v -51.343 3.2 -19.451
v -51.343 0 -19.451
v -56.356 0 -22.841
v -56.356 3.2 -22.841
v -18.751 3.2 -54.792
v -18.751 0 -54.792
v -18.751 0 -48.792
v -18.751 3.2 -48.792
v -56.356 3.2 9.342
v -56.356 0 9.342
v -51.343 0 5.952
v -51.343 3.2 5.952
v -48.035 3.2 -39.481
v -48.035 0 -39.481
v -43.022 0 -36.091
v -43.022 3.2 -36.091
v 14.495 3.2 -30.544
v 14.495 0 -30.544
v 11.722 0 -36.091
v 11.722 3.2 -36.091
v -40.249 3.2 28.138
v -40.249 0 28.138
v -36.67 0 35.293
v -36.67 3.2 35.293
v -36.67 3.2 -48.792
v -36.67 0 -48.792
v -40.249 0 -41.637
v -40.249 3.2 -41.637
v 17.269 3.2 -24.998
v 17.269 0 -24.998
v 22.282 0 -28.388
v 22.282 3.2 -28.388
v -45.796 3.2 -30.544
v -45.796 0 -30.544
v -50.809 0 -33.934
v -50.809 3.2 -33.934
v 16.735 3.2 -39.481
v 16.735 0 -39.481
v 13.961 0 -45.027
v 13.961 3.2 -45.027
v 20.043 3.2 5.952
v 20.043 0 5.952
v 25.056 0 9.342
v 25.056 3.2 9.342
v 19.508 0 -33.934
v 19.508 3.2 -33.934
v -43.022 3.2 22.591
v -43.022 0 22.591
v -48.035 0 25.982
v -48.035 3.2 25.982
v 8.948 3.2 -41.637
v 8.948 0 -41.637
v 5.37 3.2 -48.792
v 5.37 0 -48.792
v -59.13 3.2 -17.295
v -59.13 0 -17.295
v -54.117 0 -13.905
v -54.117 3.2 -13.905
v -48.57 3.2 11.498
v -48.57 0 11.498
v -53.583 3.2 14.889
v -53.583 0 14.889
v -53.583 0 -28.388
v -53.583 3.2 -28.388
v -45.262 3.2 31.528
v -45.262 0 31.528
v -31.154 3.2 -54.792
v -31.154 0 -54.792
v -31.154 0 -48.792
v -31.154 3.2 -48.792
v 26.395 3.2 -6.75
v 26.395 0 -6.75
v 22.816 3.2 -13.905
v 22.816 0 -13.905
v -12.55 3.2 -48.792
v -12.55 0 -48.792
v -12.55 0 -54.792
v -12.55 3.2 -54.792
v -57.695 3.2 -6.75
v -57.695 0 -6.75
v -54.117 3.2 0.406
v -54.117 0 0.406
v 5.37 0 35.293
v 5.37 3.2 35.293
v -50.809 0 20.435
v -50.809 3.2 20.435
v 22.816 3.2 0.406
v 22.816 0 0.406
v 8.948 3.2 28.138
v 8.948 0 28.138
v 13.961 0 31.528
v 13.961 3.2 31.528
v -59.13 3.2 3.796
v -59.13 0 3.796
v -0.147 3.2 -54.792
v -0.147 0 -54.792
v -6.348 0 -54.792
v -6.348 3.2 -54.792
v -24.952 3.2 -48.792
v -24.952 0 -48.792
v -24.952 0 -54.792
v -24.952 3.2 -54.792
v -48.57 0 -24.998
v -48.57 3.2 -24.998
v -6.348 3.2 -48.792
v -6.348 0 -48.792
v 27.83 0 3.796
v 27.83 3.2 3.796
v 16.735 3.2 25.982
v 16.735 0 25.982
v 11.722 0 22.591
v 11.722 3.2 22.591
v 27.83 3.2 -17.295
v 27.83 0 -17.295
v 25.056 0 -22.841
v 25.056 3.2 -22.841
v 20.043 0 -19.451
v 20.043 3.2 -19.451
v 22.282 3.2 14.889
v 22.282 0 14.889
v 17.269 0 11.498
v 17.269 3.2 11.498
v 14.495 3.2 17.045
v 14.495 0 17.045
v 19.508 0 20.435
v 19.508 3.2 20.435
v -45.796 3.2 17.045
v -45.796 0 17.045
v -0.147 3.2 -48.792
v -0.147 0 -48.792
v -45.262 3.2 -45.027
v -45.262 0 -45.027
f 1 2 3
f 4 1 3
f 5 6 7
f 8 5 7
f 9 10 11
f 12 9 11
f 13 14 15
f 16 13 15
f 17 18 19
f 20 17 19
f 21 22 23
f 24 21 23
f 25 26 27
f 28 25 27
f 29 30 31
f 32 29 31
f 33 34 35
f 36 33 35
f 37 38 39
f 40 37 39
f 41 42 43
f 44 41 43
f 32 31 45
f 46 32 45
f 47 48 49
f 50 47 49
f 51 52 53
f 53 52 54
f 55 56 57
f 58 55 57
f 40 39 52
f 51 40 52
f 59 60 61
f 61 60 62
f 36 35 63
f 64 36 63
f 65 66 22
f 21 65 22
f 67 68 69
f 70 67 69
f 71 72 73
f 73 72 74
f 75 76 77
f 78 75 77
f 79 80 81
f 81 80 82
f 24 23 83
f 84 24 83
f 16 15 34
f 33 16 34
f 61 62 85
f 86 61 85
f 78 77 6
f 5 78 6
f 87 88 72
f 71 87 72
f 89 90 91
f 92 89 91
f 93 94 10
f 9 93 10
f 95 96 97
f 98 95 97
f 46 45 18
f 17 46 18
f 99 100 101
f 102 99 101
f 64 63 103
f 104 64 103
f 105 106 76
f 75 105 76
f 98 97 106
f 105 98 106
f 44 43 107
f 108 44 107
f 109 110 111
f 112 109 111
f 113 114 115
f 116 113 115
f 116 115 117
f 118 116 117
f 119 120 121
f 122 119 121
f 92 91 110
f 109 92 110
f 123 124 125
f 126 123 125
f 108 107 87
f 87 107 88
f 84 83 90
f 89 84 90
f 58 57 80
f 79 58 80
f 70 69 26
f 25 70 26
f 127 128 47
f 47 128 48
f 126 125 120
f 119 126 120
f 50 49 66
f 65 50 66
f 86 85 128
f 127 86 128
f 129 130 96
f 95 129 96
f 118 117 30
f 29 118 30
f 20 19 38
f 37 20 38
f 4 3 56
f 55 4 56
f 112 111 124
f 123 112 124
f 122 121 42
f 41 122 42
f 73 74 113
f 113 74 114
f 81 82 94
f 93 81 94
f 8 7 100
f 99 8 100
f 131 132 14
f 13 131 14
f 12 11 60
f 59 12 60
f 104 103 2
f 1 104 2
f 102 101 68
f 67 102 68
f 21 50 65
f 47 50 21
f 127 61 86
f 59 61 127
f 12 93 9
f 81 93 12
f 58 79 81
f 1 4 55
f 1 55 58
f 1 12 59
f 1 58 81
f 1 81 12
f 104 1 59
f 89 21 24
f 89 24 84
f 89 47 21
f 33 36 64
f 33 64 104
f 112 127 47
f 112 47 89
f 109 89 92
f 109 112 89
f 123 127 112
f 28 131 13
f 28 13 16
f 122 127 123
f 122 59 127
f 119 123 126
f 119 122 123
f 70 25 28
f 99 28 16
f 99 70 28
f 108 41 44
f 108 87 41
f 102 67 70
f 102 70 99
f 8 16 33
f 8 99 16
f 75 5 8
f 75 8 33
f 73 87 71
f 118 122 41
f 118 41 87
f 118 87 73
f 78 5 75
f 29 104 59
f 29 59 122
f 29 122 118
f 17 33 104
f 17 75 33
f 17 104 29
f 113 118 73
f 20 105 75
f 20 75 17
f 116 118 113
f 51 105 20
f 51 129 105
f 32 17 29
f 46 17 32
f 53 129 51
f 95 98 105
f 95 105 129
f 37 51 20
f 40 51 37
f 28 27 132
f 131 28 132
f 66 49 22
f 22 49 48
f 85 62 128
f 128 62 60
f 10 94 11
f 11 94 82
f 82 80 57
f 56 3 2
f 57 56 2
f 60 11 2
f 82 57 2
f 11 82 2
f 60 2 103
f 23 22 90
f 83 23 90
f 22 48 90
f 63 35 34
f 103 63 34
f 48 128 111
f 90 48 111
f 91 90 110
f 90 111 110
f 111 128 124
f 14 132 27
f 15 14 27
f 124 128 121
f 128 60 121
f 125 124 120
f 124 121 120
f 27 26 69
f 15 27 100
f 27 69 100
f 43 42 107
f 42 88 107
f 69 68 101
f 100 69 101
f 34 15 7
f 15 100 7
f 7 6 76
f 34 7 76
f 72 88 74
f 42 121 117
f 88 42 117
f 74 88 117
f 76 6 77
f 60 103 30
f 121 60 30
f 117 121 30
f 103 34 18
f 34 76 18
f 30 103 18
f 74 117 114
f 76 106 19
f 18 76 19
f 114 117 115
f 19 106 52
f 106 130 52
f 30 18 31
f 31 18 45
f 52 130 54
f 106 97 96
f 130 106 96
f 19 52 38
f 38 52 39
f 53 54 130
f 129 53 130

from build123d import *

# Parameters (mm, degrees)
BOSS_EXTRUDE1_DEPTH = 3.2


with BuildPart() as part:
    # Sketch1 → Boss-Extrude1 (new body)
    with BuildSketch(Plane(origin=(0, 0, 0), x_dir=(1, 0, 0), z_dir=(0, 1, 0))):
        Polygon((5.369694579, -35.29298371), (8.947903919, -28.137816492), (13.960969185, -31.527970224), (16.734685449, -25.98150779), (11.721620183, -22.591354059), (14.495336447, -17.044891626), (19.508401713, -20.435045357), (22.282117977, -14.888582924), (17.269052711, -11.498429192), (20.042768975, -5.951966759), (25.055834241, -9.34212049), (27.829550505, -3.795658057), (22.816485239, -0.405504326), (26.394694579, 6.749662892), (22.816485239, 13.90483011), (27.829550505, 17.294983841), (25.055834241, 22.841446275), (20.042768975, 19.451292543), (17.269052711, 24.997754977), (22.282117977, 28.387908708), (19.508401713, 33.934371141), (14.495336447, 30.54421741), (11.721620183, 36.090679843), (16.734685449, 39.480833575), (13.960969185, 45.027296008), (8.947903919, 41.637142277), (5.369694579, 48.792309495), (-0.14692929, 48.792309495), (-0.14692929, 54.792309495), (-6.348279742, 54.792309495), (-6.348279742, 48.792309495), (-12.549630195, 48.792309495), (-12.549630195, 54.792309495), (-18.750980648, 54.792309495), (-18.750980648, 48.792309495), (-24.9523311, 48.792309495), (-24.9523311, 54.792309495), (-31.153681553, 54.792309495), (-31.153681553, 48.792309495), (-36.670305421, 48.792309495), (-40.248514761, 41.637142277), (-45.261580028, 45.027296008), (-48.035296291, 39.480833575), (-43.022231025, 36.090679843), (-45.795947289, 30.54421741), (-50.809012555, 33.934371141), (-53.582728819, 28.387908708), (-48.569663553, 24.997754977), (-51.343379817, 19.451292543), (-56.356445083, 22.841446275), (-59.130161347, 17.294983841), (-54.117096081, 13.90483011), (-57.695305421, 6.749662892), (-54.117096081, -0.405504326), (-59.130161347, -3.795658057), (-56.356445083, -9.34212049), (-51.343379817, -5.951966759), (-48.569663553, -11.498429192), (-53.582728819, -14.888582924), (-50.809012555, -20.435045357), (-45.795947289, -17.044891626), (-43.022231025, -22.591354059), (-48.035296291, -25.98150779), (-45.261580028, -31.527970224), (-40.248514761, -28.137816492), (-36.670305421, -35.29298371), align=None)
    extrude(amount=BOSS_EXTRUDE1_DEPTH)


solid = part.part
